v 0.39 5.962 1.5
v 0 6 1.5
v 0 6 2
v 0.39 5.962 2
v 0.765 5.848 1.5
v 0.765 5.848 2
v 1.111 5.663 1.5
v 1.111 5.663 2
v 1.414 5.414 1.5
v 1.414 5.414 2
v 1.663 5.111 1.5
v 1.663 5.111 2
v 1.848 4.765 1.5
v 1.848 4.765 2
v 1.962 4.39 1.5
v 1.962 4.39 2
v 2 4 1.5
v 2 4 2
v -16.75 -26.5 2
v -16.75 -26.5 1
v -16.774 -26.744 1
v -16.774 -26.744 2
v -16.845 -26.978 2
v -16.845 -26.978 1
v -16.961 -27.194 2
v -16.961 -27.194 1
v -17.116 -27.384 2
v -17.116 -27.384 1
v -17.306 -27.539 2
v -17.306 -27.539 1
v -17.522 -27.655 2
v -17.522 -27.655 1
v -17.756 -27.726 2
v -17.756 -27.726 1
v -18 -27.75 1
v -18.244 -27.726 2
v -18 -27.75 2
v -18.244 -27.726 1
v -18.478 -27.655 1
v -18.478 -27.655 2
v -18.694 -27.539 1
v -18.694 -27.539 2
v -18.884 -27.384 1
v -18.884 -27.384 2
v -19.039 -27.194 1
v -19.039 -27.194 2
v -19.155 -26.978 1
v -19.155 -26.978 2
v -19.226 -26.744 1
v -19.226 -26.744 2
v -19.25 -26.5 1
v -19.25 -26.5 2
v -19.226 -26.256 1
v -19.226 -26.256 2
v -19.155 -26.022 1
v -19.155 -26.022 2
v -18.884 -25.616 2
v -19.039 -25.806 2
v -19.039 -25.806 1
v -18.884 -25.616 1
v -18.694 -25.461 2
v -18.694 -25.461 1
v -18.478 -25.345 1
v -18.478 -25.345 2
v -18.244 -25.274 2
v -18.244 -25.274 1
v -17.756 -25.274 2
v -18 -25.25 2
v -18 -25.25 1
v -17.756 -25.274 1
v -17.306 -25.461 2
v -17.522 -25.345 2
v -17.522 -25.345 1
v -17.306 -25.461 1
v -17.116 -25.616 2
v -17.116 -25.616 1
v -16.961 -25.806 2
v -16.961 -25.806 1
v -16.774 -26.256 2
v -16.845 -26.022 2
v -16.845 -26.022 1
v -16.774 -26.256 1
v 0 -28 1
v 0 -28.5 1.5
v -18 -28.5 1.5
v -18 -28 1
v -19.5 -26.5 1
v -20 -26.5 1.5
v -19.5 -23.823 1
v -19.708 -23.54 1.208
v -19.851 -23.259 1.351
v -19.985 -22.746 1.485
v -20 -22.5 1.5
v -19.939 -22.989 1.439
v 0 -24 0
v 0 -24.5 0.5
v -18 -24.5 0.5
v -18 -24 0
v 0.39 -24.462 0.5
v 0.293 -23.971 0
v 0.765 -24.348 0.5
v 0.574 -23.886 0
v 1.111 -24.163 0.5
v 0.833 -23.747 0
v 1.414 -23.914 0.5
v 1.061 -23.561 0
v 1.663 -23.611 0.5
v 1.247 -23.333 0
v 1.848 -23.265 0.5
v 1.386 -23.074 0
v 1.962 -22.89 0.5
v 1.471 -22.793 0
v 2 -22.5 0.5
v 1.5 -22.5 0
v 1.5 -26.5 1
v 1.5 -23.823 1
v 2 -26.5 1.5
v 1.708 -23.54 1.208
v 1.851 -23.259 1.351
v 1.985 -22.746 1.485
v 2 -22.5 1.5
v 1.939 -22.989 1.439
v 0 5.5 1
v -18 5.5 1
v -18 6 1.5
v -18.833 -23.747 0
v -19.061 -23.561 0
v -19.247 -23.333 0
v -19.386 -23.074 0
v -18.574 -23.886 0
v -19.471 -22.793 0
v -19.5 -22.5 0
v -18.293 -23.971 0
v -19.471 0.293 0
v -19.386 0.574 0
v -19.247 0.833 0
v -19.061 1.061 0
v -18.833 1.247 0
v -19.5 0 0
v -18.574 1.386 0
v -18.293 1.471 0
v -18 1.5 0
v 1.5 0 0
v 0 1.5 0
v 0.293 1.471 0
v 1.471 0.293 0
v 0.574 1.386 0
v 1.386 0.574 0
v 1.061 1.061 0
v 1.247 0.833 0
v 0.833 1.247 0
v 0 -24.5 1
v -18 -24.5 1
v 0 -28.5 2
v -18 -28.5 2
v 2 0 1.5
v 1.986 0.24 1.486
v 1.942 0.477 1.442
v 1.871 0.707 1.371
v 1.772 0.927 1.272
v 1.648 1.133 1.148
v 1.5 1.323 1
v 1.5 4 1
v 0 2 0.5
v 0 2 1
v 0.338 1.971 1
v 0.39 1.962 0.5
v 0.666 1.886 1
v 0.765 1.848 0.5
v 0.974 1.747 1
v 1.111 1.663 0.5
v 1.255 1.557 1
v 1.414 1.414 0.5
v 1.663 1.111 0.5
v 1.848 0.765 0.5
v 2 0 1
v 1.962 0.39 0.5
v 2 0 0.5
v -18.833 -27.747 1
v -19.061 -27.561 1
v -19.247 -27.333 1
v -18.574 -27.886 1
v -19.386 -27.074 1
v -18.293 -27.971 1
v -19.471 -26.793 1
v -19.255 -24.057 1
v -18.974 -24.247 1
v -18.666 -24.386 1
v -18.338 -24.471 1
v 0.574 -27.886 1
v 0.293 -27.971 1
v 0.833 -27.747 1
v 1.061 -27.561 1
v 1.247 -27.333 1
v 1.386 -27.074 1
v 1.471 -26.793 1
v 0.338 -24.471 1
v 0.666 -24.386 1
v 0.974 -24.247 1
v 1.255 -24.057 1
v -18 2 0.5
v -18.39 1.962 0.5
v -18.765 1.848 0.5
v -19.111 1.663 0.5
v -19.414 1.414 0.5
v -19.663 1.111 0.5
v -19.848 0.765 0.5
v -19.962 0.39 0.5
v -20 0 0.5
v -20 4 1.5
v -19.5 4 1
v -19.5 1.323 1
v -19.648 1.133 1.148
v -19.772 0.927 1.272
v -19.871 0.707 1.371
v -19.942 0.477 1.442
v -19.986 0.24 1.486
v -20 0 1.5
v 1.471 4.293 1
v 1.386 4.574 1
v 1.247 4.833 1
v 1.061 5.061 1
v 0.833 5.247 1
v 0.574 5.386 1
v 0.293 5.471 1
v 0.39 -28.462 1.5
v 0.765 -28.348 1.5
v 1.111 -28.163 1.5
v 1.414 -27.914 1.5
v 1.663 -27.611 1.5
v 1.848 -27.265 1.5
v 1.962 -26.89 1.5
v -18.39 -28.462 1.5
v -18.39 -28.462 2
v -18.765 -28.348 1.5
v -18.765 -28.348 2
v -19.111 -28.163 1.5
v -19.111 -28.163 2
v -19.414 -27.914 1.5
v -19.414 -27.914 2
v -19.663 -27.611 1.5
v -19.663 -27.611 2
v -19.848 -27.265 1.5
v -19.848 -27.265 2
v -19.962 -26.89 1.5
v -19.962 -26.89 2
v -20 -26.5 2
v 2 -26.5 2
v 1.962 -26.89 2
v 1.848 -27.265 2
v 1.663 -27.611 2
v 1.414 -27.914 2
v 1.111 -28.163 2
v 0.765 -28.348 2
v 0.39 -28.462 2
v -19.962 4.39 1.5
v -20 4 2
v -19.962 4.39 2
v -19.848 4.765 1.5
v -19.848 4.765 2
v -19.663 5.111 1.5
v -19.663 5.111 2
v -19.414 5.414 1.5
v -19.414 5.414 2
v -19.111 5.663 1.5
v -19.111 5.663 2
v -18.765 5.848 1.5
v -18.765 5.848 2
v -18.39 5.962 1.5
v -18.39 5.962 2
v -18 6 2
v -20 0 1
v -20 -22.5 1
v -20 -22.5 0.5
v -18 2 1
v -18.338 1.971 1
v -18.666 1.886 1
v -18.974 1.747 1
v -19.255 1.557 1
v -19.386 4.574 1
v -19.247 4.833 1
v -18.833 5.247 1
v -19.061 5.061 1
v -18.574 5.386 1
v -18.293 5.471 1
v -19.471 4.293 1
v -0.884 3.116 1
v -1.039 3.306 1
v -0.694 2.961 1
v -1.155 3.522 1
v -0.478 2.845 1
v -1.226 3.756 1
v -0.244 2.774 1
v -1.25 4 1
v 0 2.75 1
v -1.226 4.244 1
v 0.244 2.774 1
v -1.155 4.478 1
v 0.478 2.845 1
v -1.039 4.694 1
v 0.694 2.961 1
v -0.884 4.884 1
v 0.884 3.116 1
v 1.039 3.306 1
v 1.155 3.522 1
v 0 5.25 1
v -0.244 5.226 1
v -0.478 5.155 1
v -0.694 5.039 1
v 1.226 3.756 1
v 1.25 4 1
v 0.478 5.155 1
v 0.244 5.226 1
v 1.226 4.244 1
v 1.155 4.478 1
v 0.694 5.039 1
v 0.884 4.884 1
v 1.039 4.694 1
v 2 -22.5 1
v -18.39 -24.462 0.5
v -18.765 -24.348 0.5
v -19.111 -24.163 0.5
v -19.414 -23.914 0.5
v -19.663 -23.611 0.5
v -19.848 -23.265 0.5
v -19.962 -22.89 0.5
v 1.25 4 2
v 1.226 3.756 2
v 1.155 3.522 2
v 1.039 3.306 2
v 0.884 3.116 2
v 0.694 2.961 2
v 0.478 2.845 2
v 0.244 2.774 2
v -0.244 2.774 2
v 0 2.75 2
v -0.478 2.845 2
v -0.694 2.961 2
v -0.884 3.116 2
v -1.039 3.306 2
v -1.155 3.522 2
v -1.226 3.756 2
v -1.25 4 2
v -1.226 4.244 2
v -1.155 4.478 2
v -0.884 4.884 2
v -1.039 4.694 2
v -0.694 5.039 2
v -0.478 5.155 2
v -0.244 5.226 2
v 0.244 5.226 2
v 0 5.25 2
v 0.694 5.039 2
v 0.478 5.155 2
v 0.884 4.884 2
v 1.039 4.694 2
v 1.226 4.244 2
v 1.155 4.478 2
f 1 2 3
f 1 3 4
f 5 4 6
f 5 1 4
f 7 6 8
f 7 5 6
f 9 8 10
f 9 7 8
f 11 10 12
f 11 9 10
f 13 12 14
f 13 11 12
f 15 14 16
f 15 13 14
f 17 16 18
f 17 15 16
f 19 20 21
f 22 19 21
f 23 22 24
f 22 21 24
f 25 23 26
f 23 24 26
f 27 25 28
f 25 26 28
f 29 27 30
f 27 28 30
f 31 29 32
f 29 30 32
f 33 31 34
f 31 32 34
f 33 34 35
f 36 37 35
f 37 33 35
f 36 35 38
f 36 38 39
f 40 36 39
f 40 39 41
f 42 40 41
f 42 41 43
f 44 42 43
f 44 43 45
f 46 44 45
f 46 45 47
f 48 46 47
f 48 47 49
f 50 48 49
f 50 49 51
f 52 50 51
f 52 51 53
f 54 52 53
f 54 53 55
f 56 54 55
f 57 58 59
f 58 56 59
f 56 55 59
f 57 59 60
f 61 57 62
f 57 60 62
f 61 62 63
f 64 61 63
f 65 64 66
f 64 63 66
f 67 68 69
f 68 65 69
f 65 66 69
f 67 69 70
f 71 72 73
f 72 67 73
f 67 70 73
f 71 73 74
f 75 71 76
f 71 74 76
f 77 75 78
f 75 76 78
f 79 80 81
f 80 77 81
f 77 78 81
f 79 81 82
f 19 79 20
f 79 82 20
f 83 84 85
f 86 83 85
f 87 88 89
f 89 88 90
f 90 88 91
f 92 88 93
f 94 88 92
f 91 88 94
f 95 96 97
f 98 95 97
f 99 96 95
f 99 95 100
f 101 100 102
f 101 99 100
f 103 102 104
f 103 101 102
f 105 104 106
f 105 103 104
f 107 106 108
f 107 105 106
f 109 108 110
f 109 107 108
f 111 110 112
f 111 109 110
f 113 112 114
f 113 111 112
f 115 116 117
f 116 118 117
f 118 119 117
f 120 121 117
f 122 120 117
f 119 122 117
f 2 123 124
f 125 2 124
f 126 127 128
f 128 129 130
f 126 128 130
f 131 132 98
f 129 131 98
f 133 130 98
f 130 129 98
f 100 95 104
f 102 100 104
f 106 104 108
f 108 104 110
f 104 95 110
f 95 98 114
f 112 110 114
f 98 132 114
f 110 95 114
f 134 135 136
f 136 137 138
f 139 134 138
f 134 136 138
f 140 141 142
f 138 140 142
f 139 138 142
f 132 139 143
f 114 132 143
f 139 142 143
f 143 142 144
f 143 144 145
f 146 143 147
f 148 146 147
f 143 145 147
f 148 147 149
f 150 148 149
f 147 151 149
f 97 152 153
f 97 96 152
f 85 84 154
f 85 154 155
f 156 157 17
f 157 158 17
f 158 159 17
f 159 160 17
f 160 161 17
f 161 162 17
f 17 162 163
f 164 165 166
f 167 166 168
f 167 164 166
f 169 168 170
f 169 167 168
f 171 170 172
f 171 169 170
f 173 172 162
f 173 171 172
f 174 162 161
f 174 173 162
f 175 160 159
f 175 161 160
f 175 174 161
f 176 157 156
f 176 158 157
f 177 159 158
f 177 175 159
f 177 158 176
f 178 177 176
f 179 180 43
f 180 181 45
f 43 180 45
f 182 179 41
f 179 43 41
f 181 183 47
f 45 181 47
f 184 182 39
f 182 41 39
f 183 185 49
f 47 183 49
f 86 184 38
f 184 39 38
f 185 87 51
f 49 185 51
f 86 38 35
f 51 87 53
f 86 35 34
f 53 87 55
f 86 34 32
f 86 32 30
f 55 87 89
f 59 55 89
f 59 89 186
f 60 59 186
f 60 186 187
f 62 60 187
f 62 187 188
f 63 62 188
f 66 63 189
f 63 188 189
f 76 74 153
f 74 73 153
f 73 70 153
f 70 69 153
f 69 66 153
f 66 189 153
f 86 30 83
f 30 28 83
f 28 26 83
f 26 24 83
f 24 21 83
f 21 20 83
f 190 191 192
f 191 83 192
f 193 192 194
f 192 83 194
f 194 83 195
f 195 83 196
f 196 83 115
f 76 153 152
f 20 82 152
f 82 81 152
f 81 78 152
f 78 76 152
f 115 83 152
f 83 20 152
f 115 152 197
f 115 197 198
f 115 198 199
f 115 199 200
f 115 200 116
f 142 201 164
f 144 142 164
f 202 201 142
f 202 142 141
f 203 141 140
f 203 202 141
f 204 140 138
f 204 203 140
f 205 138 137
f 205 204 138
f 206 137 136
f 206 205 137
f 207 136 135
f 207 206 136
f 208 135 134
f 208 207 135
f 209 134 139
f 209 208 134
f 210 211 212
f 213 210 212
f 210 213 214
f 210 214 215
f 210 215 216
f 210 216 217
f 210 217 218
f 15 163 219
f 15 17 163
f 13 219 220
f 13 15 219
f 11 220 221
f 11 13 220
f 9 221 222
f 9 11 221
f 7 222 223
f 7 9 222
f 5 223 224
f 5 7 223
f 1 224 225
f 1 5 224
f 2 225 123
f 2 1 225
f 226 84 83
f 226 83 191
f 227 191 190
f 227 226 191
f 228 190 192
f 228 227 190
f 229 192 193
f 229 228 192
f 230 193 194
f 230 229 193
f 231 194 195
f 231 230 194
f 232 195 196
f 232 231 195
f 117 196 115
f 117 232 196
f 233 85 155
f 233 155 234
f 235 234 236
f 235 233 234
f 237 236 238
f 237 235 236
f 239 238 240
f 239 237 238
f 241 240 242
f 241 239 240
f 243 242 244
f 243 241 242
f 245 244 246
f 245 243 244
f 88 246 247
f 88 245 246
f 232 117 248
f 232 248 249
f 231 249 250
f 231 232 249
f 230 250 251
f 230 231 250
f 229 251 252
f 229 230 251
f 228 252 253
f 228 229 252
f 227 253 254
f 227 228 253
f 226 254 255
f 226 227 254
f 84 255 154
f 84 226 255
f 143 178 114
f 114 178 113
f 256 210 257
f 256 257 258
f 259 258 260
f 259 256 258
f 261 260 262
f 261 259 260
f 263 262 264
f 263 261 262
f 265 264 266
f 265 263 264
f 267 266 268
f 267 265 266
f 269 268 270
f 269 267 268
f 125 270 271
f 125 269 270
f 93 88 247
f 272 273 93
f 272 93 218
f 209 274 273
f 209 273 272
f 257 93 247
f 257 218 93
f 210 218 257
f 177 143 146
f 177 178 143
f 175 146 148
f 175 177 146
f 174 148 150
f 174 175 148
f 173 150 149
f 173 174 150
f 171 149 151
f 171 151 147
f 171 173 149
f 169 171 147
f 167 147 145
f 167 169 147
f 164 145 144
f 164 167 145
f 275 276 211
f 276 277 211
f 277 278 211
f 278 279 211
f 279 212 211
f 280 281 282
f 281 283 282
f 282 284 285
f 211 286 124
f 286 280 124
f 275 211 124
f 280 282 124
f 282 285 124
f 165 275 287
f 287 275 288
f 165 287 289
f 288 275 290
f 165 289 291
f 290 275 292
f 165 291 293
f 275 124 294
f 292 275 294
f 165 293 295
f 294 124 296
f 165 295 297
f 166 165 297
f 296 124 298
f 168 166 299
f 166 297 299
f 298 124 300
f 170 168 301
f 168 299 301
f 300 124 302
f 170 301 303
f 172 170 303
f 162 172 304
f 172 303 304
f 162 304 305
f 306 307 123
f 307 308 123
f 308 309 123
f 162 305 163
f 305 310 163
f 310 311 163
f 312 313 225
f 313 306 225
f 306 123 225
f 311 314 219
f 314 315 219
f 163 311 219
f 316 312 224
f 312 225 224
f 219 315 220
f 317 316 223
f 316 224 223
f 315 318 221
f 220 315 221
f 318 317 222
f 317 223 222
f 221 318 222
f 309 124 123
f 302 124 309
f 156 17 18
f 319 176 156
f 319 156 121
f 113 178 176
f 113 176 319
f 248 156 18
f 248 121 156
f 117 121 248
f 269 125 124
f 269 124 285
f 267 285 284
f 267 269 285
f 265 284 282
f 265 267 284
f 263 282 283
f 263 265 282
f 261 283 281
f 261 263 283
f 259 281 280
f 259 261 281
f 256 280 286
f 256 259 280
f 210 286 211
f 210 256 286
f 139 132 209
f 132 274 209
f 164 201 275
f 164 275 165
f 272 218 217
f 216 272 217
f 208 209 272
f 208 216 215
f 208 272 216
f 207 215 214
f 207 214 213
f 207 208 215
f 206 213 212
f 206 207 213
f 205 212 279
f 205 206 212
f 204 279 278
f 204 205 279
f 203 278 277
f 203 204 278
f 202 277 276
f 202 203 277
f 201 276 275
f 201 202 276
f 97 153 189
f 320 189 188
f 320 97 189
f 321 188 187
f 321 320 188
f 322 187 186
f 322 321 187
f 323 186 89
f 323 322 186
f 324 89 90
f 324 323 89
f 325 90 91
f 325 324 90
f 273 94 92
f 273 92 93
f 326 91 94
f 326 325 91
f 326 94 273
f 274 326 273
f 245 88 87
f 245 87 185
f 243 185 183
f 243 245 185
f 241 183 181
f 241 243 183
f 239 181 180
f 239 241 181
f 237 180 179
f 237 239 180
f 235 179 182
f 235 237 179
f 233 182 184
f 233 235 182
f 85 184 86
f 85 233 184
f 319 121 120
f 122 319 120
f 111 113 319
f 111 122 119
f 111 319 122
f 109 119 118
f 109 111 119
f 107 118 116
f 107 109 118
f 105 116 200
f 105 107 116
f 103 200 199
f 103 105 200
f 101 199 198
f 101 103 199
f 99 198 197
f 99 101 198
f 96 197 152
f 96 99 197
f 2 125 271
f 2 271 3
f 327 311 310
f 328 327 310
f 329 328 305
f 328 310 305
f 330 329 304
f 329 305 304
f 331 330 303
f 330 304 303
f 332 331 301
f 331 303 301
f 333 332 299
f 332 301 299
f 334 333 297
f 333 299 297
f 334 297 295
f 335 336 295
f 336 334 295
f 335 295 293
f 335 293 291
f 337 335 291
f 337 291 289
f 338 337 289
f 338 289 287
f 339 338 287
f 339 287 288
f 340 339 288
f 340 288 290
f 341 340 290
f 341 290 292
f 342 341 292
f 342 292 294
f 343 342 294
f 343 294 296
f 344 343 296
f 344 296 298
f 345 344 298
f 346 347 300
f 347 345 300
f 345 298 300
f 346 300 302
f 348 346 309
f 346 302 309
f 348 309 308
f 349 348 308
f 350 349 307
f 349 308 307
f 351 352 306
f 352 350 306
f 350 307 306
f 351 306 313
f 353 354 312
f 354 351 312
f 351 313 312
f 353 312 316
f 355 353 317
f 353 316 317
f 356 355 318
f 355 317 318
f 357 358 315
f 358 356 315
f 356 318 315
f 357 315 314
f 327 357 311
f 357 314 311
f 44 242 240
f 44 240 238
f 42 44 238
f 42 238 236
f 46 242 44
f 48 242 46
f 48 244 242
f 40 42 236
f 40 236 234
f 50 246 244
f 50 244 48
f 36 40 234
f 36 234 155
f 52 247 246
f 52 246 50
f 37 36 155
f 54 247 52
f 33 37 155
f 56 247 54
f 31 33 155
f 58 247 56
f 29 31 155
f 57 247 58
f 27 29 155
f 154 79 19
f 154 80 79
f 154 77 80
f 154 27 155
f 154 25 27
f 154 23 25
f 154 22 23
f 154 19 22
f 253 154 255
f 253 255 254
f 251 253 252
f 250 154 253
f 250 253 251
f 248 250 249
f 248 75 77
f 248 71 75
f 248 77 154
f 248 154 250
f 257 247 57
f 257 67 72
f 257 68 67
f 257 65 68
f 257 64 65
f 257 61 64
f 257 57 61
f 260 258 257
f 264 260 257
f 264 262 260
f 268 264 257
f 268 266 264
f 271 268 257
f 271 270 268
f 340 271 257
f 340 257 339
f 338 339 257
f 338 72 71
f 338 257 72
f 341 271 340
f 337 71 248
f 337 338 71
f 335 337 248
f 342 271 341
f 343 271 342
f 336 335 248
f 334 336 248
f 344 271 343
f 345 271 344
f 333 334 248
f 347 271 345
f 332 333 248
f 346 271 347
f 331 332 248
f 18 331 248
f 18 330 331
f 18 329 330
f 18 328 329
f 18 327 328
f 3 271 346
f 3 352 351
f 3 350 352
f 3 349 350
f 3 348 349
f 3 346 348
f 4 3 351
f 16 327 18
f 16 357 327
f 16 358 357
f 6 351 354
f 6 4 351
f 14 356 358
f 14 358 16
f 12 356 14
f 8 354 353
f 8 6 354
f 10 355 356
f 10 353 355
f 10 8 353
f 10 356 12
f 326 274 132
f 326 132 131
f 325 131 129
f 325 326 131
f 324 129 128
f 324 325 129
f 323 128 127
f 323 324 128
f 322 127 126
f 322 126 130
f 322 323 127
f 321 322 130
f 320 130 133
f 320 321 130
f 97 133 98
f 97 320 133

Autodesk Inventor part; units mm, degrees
ref_plane "YZ Plane" through (0, 0, 0) normal (1, 0, 0) x (0, 1, 0)
ref_plane "XZ Plane" through (0, 0, 0) normal (0, 1, 0) x (-1, 0, 0)
ref_plane "XY Plane" through (0, 0, 0) normal (0, 0, 1) x (1, 0, 0)
sketch "Sketch1" plane through (0, 0, 0) normal (0, 0, 1) x (1, 0, 0)
  line L0 (0, -24.5) -> (-18, -24.5)
  line L1 (-20, -22.5) -> (-20, 0)
  line L2 (-18, 2) -> (0, 2)
  line L3 (2, 0) -> (2, -22.5)
  arc A0 (-18, 2) -> (-20, 0) centre (-18, 0) ccw
  arc A1 (2, 0) -> (0, 2) centre (0, 0) ccw
  arc A2 (0, -24.5) -> (2, -22.5) centre (0, -22.5) ccw
  arc A3 (-20, -22.5) -> (-18, -24.5) centre (-18, -22.5) ccw
  dimension "d0" = 2
  dimension "d1" = 22
  dimension "d2" = 26.5
extrude "Extrusion1" add sketch "Sketch1" along normal blind 1
sketch "Sketch2" plane through (0, 0, 1) normal (0, 0, 1) x (1, 0, 0)
  line L0 (-20, 0) -> (-20, -22.5) projected
  line L1 (-18, -24.5) -> (0, -24.5) projected
  line L2 (2, -22.5) -> (2, 0) projected
  line L3 (0, 2) -> (-18, 2) projected
  line L4 (-18, 6) -> (0, 6)
  line L5 (2, 4) -> (2, -26.5)
  line L6 (0, -28.5) -> (-18, -28.5)
  line L7 (-20, -26.5) -> (-20, 4)
  arc A0 (0, -28.5) -> (2, -26.5) centre (0, -26.5) ccw
  arc A1 (-20, -26.5) -> (-18, -28.5) centre (-18, -26.5) ccw
  arc A2 (-18, 6) -> (-20, 4) centre (-18, 4) ccw
  arc A3 (2, 4) -> (0, 6) centre (0, 4) ccw
  circle A4 centre (-18, -26.5) radius 1.25
  circle A5 centre (0, 4) radius 1.25
  point P0 (0, 0)
  dimension "d5" = 2
  dimension "d6" = 4
  dimension "d7" = 4
  dimension "d8" = 2.5
  dimension "d9" = 2.5
  dimension "d18" = 34.5
  dimension "d19" = 26.5
  dimension "d20" = 22
extrude "Extrusion2" add sketch "Sketch2" along normal blind 1
chamfer "Chamfer1" distance 0.5 angle 45 8 edges at (-19.4142, 1.4142, 0) (-20, -11.25, 0) (-19.4142, -23.9142, 0) (-9, -24.5, 0) (1.4142, -23.9142, 0) (2, -11.25, 0) (1.4142, 1.4142, 0) (-9, 2, 0)
chamfer "Chamfer2" distance 0.5 angle 45 10 edges at (-20, -24.5, 1) (-19.4142, -27.9142, 1) (-9, -28.5, 1) (1.4142, -27.9142, 1) (2, -24.5, 1) (-20, 2, 1) (-19.4142, 5.4142, 1) (-9, 6, 1) (1.4142, 5.4142, 1) (2, 2, 1)
properties part number "IO-Shield-Sideplate01"
